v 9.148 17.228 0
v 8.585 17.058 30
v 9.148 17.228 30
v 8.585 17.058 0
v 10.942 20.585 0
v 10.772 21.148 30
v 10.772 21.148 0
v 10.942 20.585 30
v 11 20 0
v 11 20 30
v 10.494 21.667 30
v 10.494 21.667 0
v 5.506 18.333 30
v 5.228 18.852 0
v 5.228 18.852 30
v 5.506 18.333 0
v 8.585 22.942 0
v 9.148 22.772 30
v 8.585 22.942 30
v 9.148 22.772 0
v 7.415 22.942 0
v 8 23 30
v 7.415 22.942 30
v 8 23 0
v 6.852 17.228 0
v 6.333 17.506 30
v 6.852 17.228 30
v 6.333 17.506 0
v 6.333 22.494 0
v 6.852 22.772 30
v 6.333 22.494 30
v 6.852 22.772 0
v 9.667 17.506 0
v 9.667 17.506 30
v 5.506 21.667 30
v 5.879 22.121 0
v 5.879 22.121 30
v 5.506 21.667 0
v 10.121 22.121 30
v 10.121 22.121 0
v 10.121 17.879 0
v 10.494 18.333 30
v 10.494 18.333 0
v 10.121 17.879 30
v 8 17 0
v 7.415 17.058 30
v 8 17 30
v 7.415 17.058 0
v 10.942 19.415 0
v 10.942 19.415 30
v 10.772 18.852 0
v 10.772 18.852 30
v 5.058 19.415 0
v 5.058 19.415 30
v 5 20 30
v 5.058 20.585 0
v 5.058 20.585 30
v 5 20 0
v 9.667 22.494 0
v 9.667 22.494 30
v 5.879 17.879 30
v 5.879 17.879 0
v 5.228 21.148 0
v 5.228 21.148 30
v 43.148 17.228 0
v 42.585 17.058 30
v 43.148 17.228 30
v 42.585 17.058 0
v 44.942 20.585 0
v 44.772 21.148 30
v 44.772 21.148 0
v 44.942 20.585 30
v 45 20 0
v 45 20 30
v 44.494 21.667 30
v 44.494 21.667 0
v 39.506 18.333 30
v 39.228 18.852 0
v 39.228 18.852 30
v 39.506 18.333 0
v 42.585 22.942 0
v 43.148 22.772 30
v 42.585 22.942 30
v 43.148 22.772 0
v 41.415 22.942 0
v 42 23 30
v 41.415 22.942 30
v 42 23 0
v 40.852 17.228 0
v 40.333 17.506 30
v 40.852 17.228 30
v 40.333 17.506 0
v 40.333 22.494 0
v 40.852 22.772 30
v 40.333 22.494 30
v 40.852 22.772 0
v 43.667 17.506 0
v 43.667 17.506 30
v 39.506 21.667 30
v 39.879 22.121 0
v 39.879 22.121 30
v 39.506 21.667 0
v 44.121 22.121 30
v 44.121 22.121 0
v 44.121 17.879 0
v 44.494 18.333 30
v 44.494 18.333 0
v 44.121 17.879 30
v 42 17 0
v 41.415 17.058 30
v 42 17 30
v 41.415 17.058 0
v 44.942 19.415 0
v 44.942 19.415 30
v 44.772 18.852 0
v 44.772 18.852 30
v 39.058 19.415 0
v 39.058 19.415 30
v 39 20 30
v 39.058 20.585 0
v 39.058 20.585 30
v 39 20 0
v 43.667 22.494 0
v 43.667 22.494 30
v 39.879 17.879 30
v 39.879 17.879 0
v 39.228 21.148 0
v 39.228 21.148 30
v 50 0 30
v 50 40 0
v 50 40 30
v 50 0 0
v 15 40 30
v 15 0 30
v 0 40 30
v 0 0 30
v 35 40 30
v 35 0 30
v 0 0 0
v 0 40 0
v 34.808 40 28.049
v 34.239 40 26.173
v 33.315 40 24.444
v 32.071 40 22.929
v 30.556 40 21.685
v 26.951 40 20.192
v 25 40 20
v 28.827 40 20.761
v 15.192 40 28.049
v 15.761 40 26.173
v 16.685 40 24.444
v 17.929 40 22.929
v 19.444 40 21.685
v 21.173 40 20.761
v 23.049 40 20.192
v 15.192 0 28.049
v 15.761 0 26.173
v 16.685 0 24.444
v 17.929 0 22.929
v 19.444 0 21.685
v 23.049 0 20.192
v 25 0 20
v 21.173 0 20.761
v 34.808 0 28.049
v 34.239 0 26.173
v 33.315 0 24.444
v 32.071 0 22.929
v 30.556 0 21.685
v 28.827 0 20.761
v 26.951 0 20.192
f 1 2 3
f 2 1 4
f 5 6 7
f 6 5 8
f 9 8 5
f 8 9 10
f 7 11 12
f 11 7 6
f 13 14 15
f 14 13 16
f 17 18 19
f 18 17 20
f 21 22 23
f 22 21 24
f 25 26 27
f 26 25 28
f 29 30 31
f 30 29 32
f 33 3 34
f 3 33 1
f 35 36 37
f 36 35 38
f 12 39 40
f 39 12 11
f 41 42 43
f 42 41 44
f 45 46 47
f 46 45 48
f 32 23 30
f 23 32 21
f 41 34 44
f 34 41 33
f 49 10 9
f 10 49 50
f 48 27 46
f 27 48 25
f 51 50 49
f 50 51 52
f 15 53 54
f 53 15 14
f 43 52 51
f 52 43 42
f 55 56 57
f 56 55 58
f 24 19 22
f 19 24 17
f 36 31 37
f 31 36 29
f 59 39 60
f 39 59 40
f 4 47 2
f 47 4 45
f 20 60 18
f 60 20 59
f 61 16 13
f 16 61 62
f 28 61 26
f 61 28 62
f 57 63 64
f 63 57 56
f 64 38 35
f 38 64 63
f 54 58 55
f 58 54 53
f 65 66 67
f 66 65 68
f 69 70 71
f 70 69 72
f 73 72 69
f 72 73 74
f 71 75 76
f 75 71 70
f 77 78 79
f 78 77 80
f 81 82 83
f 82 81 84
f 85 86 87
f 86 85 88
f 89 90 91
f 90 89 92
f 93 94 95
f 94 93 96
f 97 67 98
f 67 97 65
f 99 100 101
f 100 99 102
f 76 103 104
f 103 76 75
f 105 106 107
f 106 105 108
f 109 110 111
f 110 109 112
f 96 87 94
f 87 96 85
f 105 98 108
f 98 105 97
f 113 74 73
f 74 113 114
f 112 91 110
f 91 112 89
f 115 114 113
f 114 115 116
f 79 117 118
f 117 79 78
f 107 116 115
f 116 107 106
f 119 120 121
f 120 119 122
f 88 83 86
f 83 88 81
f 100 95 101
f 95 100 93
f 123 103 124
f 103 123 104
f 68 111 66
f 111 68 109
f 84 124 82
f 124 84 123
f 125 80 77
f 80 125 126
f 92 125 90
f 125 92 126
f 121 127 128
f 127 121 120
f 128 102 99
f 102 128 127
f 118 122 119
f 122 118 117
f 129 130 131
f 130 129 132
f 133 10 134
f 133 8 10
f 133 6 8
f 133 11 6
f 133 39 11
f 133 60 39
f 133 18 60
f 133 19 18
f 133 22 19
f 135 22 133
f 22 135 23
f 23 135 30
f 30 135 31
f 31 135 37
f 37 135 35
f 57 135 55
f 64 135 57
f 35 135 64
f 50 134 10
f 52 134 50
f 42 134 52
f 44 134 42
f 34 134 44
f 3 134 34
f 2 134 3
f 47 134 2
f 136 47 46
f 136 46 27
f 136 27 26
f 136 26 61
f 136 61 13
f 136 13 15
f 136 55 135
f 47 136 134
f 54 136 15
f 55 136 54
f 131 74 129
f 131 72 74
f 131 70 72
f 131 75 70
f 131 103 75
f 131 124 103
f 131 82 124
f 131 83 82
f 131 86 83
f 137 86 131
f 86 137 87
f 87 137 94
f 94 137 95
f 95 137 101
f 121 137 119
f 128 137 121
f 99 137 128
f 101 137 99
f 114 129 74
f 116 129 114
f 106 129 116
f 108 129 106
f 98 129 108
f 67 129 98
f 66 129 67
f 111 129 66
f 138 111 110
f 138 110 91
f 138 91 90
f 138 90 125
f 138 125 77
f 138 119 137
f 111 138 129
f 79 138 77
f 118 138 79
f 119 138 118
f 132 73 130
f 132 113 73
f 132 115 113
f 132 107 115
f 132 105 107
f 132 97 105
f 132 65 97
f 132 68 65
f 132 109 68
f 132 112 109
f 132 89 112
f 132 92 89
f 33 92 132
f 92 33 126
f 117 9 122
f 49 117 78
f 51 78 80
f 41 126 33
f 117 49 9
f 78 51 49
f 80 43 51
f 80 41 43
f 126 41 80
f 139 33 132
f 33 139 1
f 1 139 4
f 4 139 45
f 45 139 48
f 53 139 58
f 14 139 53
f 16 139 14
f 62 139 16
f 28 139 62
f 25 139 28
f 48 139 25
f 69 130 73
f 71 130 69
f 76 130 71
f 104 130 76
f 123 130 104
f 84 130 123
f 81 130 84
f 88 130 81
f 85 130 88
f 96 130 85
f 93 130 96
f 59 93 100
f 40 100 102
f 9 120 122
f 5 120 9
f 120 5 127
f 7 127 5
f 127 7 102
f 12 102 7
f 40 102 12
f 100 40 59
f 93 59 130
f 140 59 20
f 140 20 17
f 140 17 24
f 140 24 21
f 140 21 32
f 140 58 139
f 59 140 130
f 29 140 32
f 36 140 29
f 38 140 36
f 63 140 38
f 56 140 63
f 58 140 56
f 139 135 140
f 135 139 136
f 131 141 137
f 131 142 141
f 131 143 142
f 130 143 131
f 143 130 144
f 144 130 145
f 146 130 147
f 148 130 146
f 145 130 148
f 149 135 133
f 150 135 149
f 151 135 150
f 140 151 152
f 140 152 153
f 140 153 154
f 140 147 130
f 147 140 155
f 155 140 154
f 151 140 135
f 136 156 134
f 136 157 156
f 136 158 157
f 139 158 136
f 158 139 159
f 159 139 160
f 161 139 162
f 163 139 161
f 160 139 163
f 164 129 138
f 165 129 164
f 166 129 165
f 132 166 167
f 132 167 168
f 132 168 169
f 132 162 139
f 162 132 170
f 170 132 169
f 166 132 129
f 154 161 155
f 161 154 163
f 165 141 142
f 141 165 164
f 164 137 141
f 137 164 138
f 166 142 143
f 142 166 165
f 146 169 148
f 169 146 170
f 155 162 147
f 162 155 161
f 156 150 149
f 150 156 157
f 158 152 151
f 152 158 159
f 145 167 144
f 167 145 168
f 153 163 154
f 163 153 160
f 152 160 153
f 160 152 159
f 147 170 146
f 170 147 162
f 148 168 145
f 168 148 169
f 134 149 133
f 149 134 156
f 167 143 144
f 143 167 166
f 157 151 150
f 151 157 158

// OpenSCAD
$fn = 32;

// ----------------------------------------------------------------------
// Saddle clamp: plain shaft clamp
// ----------------------------------------------------------------------

// --- parameters (mm) ---
blk_l = 50;               // block length, X
blk_w = 40;               // block width, Y
blk_h = 30;               // block height
clamp_r = 10;             // shaft groove radius
hole_r = 3;               // bolt hole radius
hole_m = 8;               // bolt hole margin from the ends

saw_depth = clamp_r + 3;  // saw kerf depth

difference() {
  cube([blk_l, blk_w, blk_h]);
  translate([blk_l / 2, -1, blk_h])
    rotate([-90, 0, 0])
      cylinder(h = blk_w + 2, r = clamp_r);
  for (sx = [0, 1])
    translate([sx ? blk_l - hole_m : hole_m, blk_w / 2, -1])
      cylinder(r = hole_r, h = blk_h + 2);
}
